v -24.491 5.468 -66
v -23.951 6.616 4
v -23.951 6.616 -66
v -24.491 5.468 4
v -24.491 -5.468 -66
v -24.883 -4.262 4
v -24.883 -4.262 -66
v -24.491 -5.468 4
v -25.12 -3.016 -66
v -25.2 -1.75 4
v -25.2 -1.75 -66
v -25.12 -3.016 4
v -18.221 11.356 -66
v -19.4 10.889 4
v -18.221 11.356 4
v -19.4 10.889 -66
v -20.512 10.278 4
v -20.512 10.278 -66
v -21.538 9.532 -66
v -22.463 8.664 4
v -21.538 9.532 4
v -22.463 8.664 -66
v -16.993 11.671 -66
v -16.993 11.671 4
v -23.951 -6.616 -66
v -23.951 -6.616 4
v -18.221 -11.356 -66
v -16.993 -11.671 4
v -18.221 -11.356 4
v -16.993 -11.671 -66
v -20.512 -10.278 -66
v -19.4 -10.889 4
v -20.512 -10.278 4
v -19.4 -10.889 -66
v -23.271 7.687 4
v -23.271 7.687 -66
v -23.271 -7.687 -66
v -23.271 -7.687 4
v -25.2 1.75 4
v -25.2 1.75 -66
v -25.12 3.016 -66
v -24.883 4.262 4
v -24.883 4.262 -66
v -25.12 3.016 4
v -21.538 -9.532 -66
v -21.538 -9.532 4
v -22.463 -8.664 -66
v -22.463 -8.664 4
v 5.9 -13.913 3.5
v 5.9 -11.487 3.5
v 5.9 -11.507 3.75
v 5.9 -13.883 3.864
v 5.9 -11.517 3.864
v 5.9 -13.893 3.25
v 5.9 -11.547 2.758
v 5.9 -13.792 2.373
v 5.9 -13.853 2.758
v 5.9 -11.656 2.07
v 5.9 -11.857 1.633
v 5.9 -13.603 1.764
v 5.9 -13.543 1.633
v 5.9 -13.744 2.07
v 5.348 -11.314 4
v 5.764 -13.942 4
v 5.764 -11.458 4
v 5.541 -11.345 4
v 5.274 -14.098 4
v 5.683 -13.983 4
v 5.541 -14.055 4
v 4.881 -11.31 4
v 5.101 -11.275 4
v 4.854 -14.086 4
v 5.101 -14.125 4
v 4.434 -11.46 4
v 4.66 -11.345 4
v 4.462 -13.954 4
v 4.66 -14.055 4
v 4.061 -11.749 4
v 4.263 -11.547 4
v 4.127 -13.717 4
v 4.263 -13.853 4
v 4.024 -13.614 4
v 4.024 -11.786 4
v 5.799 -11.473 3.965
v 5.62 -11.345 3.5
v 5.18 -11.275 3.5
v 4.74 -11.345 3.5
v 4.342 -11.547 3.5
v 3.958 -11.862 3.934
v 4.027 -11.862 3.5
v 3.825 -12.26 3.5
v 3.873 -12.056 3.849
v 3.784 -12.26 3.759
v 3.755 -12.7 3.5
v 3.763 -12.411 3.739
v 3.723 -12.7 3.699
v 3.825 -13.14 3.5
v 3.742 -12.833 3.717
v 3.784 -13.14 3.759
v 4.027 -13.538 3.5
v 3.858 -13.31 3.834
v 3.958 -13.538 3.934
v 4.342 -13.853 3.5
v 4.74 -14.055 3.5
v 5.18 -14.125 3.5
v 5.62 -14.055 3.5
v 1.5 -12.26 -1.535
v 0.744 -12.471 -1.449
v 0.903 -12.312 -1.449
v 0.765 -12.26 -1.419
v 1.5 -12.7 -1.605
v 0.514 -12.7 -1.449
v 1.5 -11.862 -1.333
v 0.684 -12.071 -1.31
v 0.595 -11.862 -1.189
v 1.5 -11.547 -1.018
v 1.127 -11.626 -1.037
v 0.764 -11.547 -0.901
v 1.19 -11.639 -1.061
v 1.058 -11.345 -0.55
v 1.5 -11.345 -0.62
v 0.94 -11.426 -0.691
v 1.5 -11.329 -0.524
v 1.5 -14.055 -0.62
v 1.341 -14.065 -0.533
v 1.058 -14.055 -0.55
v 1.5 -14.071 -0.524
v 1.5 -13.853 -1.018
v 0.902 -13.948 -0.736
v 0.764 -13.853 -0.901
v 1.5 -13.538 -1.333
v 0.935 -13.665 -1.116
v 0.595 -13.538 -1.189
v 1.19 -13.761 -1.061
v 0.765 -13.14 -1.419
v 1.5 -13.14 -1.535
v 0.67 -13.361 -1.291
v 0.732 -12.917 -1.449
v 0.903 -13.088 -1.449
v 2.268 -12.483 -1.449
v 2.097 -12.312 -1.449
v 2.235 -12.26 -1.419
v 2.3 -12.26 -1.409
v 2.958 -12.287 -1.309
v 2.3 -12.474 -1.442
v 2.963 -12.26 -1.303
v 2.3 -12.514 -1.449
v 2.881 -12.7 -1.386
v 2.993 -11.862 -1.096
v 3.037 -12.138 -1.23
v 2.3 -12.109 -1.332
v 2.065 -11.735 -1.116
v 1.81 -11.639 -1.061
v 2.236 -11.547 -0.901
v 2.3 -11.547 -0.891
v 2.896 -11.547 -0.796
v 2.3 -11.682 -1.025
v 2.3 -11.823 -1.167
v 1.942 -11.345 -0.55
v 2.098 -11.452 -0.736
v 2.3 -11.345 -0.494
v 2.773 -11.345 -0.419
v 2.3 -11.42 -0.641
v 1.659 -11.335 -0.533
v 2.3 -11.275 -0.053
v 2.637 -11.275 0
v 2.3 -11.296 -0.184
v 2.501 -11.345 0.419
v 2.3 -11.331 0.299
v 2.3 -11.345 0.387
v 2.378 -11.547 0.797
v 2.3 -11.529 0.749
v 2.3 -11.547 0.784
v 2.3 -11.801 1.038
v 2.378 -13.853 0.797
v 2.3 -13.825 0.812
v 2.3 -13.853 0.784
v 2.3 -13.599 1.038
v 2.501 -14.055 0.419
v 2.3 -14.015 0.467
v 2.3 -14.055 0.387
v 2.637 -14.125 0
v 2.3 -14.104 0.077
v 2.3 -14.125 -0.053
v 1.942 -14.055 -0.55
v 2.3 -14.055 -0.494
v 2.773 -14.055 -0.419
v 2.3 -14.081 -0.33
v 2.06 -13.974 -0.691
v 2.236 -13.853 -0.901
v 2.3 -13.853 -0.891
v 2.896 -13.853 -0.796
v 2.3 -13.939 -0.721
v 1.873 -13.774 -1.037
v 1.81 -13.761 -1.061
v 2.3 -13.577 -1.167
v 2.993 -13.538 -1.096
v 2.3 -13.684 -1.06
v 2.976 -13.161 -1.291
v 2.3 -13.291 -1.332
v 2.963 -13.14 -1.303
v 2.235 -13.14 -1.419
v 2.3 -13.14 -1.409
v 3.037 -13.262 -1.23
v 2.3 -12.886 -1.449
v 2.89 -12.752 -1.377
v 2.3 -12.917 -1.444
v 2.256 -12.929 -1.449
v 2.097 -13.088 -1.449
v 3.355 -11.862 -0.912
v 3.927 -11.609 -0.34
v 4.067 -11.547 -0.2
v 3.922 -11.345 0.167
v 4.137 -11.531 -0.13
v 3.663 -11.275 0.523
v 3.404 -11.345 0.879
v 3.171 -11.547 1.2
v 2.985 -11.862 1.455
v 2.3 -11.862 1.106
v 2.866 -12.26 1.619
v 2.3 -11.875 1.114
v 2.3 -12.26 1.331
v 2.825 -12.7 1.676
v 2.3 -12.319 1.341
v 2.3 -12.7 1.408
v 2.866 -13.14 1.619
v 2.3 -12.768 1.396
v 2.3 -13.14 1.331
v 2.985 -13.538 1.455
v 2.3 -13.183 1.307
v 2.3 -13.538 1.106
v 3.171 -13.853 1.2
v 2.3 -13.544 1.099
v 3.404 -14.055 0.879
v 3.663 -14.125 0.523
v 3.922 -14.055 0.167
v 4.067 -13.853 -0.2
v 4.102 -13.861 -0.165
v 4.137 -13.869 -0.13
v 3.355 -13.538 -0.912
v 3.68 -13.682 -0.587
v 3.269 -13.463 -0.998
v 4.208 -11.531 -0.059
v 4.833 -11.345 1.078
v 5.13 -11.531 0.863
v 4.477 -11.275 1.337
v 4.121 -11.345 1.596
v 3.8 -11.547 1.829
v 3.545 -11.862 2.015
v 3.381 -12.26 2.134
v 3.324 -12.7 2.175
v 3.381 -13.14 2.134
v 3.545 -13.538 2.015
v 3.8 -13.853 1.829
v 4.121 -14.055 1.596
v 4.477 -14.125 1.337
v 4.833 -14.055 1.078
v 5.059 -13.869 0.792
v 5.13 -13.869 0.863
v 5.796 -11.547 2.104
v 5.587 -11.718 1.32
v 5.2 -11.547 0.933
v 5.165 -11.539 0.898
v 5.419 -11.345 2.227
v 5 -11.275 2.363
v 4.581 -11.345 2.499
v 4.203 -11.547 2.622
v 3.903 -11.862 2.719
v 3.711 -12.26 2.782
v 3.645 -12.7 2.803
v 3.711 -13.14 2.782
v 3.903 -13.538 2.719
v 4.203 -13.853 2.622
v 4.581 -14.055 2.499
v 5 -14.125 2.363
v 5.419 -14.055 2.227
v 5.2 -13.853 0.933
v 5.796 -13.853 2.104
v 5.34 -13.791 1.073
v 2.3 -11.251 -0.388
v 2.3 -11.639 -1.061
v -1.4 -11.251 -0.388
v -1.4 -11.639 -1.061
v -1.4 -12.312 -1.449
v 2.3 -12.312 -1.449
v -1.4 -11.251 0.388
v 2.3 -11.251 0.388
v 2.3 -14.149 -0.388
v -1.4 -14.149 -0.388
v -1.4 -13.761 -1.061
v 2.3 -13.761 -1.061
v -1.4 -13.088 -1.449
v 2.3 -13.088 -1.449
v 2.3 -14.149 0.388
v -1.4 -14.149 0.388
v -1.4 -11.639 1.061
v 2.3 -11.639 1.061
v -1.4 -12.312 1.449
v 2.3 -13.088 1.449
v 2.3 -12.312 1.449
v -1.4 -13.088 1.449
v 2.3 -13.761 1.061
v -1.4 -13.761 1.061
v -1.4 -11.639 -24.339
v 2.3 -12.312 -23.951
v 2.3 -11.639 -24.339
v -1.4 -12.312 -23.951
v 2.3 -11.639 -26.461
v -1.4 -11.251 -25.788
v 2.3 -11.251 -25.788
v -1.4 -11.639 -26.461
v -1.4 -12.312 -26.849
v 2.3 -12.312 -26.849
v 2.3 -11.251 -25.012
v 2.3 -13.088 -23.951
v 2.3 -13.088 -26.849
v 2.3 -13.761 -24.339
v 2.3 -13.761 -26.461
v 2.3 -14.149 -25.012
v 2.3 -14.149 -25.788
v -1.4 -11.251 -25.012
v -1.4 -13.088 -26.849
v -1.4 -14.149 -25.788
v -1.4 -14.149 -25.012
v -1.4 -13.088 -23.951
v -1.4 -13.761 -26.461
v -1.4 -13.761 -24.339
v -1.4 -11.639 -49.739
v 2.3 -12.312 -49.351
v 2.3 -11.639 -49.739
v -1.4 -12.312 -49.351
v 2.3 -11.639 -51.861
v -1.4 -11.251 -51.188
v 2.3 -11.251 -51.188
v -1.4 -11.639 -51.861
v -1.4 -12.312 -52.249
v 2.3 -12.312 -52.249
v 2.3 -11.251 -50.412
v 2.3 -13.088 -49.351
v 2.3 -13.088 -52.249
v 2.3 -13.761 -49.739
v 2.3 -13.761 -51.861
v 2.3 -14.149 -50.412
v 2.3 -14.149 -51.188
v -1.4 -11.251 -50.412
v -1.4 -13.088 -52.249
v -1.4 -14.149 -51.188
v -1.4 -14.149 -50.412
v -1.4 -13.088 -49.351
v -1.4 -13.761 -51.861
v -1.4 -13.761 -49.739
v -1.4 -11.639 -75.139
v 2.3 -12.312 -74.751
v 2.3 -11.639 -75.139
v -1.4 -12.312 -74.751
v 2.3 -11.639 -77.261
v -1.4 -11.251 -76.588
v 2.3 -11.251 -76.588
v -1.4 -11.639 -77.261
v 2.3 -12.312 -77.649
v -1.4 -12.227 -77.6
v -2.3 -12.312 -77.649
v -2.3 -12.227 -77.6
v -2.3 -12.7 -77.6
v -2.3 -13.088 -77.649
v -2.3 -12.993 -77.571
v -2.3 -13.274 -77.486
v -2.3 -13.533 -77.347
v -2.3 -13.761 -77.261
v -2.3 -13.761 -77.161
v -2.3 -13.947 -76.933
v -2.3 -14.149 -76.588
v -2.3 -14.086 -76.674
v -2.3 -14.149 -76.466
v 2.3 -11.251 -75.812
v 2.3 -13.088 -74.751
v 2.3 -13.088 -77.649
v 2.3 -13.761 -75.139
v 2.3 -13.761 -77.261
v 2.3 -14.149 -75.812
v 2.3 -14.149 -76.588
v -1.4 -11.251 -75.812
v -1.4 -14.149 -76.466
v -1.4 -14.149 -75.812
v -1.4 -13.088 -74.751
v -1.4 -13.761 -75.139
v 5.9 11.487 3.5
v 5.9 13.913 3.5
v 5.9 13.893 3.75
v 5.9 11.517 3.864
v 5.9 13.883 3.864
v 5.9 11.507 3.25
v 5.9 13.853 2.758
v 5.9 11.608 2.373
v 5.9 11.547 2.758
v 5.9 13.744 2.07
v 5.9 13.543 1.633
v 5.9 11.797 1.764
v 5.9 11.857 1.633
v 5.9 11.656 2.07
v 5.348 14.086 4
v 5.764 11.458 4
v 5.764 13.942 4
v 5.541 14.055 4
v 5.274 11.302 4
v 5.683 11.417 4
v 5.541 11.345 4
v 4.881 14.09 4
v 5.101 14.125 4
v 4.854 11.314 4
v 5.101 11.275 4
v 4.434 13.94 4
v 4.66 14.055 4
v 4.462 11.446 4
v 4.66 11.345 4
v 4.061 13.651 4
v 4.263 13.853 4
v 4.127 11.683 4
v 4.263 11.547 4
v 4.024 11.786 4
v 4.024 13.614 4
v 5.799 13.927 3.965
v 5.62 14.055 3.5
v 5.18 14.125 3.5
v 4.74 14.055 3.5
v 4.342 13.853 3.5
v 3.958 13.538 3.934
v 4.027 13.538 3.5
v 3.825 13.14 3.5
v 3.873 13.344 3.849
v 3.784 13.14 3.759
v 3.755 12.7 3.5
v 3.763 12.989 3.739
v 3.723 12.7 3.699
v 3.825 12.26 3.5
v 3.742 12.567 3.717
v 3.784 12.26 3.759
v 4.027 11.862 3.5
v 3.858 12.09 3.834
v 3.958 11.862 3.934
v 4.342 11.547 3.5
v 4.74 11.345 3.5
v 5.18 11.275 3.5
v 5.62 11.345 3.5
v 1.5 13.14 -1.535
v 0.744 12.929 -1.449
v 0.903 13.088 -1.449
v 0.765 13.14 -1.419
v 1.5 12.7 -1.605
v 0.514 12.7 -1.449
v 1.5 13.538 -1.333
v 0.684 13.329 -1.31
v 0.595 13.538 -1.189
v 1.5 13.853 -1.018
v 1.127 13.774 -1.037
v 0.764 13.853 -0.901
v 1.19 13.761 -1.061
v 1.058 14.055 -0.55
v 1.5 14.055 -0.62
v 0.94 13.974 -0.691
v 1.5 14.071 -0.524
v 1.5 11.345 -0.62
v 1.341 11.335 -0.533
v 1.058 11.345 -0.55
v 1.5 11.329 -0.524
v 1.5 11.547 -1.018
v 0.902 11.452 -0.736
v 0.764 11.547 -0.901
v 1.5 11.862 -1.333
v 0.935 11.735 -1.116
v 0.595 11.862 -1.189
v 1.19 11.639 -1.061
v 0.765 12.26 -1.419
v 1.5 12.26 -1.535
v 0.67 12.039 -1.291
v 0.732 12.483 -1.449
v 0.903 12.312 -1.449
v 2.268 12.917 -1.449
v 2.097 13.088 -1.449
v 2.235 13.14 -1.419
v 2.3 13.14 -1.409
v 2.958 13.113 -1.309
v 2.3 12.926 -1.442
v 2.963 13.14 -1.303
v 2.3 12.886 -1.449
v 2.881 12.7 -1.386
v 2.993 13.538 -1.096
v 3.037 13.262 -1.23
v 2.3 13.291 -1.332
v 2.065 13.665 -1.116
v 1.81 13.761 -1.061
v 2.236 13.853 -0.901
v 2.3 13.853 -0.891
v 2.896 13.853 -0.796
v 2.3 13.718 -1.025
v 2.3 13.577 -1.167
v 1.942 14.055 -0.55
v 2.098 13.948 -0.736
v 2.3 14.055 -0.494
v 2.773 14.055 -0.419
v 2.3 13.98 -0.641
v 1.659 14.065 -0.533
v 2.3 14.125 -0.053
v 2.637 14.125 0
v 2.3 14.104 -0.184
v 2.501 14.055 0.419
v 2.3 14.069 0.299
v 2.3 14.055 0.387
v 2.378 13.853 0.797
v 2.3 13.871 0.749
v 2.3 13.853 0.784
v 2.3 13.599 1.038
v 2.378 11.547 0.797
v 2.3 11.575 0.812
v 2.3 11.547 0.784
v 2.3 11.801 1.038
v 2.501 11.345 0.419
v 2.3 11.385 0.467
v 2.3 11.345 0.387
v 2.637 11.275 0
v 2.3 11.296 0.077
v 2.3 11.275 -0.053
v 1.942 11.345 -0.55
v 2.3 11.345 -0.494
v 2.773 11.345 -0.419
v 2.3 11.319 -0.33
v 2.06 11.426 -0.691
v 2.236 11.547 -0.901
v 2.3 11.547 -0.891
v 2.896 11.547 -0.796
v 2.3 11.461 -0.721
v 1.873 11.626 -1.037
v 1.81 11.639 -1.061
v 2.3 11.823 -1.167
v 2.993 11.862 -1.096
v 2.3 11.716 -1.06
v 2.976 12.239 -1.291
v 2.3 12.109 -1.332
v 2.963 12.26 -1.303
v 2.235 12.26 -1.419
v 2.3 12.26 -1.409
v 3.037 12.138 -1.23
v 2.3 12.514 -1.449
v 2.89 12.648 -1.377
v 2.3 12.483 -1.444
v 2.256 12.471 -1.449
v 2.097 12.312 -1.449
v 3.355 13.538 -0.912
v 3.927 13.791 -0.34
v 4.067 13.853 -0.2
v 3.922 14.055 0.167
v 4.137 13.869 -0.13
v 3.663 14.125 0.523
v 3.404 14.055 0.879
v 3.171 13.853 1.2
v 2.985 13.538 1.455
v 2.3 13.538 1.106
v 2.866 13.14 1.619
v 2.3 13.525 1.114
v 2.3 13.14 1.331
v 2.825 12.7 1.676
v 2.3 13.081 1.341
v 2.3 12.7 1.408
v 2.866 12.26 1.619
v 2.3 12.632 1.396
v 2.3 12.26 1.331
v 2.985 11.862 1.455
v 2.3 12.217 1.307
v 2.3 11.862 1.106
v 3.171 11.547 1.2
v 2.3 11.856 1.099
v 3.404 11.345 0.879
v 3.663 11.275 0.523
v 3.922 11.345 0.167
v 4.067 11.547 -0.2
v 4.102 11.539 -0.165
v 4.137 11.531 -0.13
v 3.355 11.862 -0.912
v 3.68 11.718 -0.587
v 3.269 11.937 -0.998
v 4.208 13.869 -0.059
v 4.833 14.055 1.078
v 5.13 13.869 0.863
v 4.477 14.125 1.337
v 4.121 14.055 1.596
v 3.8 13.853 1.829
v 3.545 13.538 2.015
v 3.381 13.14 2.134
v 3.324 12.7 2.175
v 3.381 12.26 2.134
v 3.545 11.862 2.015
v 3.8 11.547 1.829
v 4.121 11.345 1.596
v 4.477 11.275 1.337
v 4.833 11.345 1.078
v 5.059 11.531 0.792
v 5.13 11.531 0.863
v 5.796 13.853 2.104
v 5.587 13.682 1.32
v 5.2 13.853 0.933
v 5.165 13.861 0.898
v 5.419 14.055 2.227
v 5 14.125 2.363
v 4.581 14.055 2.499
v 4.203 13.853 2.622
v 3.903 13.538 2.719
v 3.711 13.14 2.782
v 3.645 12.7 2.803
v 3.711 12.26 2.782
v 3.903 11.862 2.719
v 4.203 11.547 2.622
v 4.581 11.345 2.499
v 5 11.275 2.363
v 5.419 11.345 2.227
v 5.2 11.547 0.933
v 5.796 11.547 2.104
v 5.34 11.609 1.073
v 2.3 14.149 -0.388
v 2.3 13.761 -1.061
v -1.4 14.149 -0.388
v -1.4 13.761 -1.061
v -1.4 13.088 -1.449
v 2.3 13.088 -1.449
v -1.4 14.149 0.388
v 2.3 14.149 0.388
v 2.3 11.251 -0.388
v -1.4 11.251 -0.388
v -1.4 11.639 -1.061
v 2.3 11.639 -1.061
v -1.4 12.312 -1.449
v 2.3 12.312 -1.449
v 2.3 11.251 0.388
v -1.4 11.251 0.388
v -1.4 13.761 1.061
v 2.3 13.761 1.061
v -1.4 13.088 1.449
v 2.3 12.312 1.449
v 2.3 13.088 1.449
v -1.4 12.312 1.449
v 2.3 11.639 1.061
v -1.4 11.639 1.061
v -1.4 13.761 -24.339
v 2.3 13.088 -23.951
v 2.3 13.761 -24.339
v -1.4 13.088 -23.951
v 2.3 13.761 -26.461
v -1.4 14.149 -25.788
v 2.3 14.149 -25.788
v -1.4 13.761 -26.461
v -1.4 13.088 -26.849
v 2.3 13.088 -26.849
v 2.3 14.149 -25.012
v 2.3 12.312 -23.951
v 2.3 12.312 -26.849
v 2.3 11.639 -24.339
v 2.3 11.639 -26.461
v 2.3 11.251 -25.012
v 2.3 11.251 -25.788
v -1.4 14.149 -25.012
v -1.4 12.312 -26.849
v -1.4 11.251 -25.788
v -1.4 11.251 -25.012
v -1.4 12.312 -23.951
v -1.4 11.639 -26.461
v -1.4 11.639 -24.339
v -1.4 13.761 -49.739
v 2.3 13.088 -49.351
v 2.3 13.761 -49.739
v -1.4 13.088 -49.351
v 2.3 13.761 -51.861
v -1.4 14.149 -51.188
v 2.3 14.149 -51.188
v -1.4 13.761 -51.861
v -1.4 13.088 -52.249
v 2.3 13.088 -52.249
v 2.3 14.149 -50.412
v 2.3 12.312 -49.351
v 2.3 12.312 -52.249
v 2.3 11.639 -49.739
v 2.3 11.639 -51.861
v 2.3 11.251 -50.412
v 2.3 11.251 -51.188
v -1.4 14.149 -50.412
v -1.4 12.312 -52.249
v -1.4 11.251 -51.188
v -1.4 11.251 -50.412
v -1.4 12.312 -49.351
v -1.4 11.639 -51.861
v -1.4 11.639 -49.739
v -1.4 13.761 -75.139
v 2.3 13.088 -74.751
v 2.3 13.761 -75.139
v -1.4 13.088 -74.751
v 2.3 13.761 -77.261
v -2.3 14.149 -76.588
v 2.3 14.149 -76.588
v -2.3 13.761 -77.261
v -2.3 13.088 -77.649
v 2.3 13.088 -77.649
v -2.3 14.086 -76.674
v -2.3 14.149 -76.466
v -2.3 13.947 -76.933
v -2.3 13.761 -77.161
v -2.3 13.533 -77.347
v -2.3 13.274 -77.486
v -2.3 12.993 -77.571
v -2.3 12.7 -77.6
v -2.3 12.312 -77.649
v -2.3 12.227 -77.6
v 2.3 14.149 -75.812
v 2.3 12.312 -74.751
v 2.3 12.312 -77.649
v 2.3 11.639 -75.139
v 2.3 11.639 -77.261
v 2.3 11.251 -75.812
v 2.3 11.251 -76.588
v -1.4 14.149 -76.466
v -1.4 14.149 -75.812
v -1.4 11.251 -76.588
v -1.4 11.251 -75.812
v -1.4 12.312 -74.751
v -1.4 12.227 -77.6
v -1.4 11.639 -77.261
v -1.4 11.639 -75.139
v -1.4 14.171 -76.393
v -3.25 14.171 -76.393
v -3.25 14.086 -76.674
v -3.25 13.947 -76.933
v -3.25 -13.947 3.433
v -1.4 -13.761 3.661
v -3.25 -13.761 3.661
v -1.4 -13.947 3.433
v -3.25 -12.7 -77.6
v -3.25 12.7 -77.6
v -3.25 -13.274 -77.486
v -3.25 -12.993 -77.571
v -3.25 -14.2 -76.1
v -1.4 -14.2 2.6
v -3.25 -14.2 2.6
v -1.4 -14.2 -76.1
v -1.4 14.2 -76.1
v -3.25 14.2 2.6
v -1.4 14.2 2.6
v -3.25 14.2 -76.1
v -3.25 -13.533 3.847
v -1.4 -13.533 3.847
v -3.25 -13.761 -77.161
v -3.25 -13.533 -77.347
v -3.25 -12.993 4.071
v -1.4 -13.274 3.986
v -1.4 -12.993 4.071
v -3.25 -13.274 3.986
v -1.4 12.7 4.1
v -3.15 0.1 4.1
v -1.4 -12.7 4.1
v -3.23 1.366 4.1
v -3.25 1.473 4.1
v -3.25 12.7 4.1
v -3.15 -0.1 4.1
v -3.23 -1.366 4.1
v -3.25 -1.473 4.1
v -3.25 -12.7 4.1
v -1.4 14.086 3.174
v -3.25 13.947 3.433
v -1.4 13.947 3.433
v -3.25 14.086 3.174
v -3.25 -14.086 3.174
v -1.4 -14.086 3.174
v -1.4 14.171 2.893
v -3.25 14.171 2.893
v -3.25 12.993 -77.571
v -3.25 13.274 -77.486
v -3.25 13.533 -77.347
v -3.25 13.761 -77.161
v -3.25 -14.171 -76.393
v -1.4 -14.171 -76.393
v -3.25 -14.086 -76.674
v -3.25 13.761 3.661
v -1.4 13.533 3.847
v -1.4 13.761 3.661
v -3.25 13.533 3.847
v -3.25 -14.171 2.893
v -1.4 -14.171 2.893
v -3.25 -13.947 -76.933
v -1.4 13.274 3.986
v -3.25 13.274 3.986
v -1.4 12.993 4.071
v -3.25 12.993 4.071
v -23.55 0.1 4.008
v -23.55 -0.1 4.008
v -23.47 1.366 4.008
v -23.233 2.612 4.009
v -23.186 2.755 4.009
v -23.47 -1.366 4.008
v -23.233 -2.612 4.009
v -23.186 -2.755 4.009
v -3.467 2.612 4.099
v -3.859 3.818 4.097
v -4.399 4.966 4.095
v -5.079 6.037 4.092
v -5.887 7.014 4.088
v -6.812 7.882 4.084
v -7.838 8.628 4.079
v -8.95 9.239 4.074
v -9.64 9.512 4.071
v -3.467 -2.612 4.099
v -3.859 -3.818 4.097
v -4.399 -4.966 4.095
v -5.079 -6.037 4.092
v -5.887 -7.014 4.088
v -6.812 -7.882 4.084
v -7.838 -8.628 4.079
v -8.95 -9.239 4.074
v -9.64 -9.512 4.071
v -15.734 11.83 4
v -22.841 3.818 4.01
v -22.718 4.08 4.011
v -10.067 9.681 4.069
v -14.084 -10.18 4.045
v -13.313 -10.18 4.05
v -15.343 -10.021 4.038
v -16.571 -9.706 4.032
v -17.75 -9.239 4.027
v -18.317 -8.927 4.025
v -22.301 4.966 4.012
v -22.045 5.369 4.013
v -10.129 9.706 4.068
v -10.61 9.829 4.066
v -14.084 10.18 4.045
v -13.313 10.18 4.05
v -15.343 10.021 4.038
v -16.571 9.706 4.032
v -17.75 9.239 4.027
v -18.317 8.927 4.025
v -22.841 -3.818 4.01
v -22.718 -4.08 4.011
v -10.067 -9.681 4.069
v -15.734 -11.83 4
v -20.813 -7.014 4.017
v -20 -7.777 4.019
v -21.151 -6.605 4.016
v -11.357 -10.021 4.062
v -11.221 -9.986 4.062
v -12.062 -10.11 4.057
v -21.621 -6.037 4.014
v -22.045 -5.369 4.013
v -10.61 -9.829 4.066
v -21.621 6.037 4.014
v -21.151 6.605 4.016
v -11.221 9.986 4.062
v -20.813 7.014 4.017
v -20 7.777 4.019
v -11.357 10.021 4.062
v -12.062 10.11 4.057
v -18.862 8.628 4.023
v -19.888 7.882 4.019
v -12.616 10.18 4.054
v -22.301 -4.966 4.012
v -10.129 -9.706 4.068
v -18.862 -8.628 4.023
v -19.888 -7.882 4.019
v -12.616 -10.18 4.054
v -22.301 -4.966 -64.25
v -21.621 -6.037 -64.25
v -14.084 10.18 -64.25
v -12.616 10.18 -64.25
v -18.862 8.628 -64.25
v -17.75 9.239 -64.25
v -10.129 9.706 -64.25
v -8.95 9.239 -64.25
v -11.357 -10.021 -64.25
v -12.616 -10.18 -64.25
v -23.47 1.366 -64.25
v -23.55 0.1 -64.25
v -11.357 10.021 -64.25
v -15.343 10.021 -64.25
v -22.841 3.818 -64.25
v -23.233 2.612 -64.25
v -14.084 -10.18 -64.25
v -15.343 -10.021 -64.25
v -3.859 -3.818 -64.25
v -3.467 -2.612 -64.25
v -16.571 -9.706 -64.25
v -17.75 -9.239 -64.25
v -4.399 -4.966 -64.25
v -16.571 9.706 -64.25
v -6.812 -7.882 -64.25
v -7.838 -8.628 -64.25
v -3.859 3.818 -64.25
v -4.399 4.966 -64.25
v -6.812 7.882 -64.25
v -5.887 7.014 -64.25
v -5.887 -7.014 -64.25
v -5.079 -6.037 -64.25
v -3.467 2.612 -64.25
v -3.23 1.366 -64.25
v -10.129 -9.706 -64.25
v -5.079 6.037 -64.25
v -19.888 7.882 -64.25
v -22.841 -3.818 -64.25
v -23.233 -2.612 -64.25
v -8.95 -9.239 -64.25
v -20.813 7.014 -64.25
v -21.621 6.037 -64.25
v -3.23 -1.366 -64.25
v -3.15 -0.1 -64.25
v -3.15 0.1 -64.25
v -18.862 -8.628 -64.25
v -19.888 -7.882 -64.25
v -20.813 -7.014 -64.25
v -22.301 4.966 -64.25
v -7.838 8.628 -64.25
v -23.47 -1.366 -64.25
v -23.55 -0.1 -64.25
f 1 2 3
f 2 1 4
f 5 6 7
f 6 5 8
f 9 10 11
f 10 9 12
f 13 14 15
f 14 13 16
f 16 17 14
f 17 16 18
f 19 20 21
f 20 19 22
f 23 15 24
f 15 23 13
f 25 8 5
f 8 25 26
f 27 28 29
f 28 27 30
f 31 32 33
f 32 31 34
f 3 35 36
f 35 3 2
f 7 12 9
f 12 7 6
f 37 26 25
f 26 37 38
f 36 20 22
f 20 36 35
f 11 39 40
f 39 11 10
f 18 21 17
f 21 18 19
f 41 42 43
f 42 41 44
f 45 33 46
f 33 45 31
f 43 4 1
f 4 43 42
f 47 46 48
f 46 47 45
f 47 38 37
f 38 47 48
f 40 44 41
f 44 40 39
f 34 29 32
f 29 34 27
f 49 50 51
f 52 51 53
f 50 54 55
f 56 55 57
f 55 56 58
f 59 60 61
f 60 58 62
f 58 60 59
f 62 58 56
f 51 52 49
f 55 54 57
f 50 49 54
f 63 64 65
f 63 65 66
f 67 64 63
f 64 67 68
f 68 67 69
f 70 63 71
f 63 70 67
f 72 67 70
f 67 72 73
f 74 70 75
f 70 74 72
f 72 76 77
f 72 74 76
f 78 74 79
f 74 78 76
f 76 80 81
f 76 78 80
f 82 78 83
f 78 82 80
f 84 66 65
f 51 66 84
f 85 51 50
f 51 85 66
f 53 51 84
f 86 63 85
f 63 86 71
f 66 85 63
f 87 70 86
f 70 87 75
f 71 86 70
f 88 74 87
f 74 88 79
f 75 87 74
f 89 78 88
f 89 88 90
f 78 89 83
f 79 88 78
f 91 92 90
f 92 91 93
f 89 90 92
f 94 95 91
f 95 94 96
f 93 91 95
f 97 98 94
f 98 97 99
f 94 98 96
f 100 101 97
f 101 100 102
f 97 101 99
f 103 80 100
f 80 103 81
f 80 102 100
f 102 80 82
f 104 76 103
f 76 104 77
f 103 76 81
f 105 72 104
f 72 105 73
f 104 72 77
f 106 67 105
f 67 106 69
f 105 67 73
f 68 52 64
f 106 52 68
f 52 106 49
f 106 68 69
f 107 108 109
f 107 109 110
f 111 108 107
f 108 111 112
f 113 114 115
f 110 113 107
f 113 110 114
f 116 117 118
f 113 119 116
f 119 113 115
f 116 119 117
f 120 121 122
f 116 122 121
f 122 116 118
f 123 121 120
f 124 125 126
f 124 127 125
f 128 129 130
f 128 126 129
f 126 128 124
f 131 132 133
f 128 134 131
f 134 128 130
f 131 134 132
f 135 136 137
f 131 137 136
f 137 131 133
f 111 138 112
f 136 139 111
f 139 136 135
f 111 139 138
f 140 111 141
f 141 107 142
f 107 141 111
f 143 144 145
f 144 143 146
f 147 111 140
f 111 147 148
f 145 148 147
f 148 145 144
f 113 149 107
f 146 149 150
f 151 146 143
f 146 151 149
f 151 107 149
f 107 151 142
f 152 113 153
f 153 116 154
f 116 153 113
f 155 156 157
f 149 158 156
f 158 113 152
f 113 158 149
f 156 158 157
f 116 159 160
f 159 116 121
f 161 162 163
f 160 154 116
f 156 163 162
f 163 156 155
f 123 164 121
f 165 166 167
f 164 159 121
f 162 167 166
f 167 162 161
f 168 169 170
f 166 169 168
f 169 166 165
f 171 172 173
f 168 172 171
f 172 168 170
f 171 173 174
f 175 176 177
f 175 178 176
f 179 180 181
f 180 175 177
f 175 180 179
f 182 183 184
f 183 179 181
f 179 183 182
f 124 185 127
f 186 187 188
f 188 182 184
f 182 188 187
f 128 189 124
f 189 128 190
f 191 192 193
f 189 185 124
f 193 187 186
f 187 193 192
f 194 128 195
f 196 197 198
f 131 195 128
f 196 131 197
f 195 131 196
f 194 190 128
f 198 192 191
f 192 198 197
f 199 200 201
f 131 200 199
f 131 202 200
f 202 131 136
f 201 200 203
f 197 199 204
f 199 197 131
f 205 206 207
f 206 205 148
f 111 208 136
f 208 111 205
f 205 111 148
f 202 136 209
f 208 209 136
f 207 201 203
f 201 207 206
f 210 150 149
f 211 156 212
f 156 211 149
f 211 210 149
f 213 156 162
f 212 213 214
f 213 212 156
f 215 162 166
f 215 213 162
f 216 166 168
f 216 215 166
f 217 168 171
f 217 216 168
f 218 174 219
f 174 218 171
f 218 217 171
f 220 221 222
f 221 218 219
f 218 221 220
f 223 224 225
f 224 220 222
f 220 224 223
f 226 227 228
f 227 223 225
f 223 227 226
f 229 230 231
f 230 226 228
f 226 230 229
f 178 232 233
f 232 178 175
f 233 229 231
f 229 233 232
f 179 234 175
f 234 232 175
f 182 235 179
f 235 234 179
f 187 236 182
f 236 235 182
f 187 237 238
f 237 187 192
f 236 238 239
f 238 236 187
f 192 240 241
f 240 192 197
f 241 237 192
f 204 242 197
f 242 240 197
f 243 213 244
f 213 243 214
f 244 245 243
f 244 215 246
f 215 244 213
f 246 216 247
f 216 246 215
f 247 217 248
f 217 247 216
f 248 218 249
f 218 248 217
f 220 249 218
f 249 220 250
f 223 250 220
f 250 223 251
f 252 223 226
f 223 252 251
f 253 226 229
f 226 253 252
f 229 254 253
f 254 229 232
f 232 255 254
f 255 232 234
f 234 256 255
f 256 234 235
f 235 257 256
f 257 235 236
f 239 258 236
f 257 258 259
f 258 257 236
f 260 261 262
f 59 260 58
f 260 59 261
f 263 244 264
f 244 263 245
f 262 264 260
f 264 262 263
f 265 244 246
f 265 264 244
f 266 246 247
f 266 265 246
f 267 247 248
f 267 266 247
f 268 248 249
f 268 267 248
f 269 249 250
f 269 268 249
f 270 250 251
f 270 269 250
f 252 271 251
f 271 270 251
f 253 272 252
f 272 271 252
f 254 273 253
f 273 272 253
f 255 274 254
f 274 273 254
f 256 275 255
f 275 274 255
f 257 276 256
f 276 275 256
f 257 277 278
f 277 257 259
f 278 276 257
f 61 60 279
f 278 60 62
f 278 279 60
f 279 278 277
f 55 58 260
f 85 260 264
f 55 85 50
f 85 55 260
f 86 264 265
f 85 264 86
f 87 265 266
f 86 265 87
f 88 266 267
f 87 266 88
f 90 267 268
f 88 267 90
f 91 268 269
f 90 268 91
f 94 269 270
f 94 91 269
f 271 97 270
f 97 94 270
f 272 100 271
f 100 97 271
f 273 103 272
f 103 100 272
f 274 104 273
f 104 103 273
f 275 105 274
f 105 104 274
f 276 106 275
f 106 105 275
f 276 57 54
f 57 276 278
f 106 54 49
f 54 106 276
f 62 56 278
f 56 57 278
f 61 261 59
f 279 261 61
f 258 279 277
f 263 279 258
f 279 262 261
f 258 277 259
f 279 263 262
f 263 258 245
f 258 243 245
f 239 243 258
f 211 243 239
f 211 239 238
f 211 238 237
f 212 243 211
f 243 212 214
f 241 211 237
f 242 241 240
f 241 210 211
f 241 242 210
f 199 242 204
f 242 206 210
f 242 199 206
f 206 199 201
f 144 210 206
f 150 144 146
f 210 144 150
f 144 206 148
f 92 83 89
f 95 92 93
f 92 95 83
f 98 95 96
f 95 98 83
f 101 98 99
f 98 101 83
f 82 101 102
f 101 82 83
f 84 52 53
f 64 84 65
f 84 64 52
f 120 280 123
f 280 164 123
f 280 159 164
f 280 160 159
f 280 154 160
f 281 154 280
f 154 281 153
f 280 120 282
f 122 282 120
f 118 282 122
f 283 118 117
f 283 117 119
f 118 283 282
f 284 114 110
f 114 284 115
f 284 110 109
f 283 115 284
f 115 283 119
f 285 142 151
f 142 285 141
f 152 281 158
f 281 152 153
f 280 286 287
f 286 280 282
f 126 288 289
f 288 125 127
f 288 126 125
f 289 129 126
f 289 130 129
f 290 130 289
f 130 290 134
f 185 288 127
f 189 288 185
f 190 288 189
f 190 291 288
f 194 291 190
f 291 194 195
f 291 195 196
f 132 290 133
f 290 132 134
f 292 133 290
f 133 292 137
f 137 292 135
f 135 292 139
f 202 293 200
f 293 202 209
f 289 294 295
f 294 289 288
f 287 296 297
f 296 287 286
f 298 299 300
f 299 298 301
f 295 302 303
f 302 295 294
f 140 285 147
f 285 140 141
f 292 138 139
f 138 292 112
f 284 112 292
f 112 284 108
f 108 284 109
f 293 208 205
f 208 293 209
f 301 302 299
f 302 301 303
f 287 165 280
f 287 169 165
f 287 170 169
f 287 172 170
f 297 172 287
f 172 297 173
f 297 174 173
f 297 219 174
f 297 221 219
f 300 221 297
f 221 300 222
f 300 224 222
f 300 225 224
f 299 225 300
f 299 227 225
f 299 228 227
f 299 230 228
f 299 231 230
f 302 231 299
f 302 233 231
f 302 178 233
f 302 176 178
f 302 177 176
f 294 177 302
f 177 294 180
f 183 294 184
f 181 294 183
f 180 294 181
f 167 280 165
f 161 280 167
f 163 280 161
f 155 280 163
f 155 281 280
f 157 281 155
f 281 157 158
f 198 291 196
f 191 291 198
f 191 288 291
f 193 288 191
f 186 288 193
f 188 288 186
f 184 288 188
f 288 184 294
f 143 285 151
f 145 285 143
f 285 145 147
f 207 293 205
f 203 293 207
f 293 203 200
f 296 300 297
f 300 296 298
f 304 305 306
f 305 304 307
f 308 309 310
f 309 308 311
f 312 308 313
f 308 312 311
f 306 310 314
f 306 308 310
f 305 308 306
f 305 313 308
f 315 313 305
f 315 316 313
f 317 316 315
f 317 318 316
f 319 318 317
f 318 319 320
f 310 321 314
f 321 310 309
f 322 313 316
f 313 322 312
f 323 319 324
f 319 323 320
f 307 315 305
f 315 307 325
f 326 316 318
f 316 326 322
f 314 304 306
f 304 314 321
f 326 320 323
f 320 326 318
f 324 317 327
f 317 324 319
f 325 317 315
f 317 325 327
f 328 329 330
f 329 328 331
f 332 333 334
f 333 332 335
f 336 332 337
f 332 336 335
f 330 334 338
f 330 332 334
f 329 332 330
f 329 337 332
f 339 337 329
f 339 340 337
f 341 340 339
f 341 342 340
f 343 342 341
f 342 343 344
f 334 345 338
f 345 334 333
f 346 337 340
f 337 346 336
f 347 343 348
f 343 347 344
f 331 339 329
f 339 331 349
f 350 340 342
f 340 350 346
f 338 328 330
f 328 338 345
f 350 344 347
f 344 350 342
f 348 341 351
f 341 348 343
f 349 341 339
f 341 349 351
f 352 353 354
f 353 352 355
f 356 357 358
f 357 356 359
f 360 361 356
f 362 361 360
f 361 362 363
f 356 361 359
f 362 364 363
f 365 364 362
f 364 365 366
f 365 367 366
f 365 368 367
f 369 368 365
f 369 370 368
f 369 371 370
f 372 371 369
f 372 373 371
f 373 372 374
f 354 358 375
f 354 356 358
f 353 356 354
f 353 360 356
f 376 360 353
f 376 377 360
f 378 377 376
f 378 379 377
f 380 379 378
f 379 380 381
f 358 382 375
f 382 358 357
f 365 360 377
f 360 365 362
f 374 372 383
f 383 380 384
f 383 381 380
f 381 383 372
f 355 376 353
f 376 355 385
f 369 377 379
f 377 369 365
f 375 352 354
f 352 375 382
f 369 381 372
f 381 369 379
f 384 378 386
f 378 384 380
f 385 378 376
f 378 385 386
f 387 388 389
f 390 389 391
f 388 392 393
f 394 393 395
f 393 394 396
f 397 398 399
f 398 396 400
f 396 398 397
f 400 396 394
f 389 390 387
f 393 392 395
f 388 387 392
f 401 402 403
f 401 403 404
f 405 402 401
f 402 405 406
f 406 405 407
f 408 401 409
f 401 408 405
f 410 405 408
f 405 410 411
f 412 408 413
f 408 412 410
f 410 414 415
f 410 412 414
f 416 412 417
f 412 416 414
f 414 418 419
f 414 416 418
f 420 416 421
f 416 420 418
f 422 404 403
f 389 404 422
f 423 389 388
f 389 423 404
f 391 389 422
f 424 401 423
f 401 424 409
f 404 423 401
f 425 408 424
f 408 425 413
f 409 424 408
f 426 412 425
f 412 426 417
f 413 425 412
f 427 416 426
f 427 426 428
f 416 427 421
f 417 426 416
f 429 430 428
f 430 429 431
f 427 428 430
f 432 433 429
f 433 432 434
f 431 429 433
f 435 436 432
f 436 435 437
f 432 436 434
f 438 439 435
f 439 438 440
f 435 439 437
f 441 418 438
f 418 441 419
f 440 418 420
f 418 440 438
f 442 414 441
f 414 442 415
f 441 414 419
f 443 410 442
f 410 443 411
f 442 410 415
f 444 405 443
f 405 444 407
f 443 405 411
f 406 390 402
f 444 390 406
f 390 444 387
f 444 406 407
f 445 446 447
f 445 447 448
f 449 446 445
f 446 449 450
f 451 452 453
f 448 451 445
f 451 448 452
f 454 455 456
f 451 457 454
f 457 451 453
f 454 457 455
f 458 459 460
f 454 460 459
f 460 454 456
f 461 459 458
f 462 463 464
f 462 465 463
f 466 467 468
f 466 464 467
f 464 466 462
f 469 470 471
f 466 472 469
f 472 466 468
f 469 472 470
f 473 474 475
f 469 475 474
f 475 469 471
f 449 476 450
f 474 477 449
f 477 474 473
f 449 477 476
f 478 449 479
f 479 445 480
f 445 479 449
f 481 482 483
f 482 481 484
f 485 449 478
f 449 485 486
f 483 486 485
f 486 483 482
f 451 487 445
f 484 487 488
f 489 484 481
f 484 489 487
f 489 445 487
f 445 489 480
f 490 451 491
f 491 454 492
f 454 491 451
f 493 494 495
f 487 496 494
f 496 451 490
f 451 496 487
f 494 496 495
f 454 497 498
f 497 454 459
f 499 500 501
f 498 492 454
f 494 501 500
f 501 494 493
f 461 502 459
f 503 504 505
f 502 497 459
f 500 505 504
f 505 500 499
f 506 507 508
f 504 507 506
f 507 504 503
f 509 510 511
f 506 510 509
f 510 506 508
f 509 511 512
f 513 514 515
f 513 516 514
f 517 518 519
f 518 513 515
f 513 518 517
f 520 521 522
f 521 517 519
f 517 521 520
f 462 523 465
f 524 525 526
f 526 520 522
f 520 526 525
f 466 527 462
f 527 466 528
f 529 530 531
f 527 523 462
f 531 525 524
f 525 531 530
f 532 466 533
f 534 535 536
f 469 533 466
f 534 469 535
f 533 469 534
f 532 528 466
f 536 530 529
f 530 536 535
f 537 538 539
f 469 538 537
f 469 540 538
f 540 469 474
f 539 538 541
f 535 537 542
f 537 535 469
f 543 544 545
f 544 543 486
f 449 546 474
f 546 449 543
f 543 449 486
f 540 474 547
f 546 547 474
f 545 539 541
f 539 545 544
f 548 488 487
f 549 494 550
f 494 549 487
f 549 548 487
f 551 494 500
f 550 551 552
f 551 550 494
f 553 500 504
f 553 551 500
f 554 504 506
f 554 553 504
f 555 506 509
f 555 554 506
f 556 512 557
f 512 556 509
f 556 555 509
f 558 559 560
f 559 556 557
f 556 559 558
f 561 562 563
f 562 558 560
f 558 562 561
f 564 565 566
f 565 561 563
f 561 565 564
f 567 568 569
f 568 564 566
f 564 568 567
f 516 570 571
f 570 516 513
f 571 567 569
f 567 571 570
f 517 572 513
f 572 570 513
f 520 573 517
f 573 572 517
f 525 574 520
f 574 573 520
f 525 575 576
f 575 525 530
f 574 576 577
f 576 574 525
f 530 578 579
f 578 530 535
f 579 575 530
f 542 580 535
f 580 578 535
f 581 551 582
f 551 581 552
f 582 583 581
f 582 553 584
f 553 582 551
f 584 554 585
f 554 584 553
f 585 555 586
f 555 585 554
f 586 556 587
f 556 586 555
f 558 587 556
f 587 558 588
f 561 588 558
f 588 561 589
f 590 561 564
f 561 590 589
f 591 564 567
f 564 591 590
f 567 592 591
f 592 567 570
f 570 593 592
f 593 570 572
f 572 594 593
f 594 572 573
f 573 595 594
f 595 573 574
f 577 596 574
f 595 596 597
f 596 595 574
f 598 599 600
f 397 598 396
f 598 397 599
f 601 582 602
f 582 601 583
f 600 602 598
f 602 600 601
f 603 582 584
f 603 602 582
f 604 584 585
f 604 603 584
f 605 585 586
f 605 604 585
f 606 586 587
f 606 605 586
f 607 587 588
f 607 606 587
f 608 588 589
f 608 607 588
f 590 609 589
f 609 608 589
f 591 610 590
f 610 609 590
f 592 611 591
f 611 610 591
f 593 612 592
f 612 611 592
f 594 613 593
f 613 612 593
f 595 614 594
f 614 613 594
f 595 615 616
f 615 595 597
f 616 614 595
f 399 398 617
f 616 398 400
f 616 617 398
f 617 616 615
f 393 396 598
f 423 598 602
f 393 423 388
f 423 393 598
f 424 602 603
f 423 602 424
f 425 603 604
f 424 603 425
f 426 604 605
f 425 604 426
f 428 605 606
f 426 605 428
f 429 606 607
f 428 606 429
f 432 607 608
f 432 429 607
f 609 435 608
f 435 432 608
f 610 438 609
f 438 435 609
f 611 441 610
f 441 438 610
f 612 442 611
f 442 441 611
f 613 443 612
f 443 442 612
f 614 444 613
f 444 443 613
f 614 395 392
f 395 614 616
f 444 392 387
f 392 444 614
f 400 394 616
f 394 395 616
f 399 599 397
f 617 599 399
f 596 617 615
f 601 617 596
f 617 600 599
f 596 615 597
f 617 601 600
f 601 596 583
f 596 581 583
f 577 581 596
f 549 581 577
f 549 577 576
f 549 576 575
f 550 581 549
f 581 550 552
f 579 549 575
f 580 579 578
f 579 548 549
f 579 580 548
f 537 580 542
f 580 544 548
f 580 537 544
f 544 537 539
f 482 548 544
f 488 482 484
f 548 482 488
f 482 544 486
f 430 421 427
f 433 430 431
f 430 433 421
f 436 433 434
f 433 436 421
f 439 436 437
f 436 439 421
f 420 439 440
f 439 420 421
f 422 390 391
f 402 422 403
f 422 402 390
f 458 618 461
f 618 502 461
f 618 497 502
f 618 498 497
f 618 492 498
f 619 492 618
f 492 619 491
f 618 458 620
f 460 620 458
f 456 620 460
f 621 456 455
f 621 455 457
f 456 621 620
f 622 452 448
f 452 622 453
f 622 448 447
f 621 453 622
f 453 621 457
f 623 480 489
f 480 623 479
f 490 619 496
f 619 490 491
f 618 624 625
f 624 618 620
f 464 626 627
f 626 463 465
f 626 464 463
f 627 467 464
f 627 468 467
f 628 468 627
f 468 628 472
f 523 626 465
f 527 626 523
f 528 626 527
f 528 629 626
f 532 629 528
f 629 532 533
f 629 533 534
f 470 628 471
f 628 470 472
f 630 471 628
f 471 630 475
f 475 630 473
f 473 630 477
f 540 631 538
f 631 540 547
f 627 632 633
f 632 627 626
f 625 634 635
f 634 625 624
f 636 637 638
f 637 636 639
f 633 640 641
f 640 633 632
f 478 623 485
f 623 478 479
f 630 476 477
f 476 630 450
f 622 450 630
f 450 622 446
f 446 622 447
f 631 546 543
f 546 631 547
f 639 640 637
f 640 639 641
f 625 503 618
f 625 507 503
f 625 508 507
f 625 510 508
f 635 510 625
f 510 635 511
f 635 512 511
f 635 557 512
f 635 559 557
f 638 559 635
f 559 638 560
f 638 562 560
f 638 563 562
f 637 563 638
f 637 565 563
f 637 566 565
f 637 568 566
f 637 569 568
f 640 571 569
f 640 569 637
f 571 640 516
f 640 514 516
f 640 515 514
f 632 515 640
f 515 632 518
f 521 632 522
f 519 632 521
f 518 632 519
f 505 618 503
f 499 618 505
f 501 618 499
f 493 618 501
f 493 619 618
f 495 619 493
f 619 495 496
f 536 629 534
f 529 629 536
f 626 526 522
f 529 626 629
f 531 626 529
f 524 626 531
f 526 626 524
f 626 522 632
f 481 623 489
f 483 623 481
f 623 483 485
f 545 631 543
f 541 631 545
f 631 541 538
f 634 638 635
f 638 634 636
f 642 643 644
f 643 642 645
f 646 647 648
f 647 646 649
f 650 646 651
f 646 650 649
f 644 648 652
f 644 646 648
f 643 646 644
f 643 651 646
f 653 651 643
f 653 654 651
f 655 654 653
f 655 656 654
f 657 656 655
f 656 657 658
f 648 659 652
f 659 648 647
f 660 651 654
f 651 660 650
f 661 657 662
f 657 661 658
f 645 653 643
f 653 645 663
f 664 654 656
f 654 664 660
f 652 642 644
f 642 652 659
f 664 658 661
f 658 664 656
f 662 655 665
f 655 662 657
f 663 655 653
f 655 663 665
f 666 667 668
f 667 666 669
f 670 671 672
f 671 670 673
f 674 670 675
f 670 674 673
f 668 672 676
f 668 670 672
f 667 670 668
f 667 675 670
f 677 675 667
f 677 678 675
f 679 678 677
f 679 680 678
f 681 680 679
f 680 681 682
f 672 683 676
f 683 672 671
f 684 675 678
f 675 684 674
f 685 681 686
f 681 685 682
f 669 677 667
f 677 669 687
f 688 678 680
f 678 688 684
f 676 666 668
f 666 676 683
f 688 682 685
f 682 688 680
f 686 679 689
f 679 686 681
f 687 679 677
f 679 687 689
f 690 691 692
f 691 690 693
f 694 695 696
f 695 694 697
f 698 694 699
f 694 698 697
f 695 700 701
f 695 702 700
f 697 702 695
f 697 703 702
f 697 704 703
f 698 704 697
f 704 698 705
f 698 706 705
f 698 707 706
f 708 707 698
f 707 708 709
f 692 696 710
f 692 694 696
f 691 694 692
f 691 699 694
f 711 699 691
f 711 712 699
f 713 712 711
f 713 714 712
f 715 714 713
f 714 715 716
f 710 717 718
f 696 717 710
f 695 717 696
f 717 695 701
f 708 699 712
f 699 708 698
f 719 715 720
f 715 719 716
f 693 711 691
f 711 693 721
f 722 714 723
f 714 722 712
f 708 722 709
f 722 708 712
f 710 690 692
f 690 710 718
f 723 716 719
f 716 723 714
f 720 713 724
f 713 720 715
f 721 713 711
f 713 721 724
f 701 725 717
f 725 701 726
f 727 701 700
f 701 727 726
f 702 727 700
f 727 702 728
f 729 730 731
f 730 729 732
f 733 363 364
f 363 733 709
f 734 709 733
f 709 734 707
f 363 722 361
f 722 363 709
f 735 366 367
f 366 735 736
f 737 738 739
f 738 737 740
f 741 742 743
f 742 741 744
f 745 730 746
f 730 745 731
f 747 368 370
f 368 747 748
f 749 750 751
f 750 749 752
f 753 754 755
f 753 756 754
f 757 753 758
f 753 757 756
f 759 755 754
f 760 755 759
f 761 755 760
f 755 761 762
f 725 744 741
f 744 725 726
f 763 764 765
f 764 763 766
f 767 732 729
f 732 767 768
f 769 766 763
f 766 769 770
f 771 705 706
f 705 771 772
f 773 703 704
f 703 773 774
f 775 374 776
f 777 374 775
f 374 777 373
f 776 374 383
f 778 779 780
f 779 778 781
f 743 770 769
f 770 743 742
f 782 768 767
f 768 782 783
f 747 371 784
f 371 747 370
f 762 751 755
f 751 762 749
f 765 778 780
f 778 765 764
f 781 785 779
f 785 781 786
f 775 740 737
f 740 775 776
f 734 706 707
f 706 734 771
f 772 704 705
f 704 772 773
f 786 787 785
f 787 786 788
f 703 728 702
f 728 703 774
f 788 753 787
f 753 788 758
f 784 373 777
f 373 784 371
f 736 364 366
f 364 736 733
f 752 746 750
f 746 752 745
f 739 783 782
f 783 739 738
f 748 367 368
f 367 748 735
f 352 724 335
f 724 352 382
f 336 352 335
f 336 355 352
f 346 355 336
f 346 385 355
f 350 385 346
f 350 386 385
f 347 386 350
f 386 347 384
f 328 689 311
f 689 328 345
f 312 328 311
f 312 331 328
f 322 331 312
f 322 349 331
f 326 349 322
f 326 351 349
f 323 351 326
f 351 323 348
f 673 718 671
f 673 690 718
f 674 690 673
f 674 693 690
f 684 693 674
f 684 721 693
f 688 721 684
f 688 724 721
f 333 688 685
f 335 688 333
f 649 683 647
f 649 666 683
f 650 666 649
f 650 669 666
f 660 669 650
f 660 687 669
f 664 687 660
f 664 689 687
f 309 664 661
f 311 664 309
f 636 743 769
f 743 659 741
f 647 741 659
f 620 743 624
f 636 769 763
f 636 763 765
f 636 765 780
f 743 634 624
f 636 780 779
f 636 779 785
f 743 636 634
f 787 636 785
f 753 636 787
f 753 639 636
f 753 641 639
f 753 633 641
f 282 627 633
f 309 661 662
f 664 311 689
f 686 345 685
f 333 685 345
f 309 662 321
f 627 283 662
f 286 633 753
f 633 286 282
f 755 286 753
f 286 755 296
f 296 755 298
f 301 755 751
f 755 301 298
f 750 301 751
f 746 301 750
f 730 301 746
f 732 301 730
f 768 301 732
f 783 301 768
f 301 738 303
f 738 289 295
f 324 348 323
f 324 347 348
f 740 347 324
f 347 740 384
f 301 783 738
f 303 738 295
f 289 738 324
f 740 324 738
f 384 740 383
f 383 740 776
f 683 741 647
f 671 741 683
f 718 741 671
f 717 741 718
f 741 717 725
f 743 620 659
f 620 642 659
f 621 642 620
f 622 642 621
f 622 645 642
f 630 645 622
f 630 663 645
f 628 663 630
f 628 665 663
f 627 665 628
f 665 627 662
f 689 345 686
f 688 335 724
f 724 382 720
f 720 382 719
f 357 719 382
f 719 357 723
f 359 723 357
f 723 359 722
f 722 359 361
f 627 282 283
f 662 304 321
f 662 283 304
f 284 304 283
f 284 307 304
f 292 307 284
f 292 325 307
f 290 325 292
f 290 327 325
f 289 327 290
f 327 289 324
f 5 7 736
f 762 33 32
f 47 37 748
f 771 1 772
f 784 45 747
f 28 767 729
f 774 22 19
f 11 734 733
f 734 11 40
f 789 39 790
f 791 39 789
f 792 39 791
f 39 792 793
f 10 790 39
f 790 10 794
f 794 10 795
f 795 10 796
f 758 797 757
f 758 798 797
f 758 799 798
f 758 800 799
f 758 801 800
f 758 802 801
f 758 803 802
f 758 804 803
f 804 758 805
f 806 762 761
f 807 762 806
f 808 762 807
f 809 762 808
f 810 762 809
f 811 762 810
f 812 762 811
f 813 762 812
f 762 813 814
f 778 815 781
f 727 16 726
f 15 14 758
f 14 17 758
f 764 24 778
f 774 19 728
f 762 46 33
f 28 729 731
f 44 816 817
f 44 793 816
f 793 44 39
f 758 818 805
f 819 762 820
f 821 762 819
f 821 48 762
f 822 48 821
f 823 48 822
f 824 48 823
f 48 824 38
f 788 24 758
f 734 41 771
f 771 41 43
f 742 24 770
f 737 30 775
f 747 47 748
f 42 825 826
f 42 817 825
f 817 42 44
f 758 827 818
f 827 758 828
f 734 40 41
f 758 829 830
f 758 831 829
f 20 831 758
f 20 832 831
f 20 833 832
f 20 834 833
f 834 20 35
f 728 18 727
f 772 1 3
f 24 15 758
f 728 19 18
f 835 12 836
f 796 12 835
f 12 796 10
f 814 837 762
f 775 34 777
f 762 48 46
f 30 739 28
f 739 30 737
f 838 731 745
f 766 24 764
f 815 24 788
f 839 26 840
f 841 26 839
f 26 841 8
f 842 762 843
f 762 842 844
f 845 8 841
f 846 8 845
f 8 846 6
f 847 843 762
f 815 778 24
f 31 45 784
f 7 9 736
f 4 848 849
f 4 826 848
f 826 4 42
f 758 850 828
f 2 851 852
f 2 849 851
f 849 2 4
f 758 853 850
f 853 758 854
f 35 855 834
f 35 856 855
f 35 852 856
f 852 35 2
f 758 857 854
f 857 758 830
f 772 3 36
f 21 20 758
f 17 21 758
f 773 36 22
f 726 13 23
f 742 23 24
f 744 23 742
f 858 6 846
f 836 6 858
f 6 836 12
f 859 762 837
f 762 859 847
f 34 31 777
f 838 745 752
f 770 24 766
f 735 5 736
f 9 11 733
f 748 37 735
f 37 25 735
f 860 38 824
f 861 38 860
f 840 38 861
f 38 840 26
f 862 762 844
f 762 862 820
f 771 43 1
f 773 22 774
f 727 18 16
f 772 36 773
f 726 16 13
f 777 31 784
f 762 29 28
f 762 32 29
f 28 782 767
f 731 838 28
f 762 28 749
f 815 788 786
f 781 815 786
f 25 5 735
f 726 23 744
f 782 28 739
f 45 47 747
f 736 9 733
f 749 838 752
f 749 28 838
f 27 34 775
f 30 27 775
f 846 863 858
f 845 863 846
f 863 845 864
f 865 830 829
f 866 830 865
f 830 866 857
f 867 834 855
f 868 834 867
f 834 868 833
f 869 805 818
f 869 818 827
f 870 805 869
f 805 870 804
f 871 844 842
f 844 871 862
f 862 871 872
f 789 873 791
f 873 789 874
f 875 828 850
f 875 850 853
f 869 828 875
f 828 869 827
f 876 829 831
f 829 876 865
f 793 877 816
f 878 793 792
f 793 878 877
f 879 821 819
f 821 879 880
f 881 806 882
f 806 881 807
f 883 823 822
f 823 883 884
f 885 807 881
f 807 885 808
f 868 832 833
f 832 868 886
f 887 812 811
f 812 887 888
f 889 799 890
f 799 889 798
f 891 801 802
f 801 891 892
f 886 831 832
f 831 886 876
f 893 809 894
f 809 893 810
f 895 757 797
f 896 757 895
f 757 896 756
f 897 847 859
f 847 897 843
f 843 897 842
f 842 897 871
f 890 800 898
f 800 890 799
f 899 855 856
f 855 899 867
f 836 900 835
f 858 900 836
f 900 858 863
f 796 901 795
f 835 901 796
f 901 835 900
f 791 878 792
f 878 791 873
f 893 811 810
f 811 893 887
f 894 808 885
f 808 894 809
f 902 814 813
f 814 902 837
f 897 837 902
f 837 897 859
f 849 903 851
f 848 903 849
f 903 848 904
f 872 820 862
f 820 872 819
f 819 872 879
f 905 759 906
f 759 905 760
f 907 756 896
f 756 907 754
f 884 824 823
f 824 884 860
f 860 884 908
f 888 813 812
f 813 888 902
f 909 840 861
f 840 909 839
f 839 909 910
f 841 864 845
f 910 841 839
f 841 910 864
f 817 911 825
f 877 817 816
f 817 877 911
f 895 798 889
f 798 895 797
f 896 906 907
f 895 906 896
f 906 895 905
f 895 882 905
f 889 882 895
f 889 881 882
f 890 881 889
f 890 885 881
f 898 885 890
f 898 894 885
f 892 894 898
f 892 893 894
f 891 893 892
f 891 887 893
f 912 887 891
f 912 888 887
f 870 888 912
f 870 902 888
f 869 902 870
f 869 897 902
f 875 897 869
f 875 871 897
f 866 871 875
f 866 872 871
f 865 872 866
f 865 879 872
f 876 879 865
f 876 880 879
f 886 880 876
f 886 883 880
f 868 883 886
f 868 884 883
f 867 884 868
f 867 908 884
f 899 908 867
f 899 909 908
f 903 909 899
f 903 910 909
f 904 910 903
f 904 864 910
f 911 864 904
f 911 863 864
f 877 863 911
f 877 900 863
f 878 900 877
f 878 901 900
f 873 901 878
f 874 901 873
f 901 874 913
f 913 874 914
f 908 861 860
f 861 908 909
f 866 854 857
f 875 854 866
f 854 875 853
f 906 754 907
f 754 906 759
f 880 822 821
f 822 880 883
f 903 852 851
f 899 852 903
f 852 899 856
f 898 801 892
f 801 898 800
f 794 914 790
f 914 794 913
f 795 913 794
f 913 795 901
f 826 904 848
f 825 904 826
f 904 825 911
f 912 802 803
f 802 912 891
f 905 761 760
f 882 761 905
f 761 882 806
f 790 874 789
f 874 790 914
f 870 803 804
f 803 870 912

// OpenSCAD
// PEGSTR - Pegboard Wizard
// Design by Marius Gheorghescu, November 2014
// Update log:
// November 9th 2014
//		- first coomplete version. Angled holders are often odd/incorrect.
// November 15th 2014
//		- minor tweaks to increase rendering speed. added logo. 
// November 28th 2014
//		- bug fixes
// June 14th 2016
//		- added holder_x_size_space and  holder_y_size_space
//		- handling different hole_size

// preview[view:north, tilt:bottom diagonal]

// width of the orifice
holder_x_size = 20;

// x space between orifice
holder_x_size_space = 2;

// depth of the orifice
holder_y_size = 20;

// y space between orifice
holder_y_size_space = 2;

// hight of the holder
holder_height = 70;

// how thick are the walls. Hint: 6*extrusion width produces the best results.
wall_thickness = 1.85;

// how many times to repeat the holder on X axis
holder_x_count = 1;

// how many times to repeat the holder on Y axis
holder_y_count = 1;

// orifice corner radius (roundness). Needs to be less than min(x,y)/2.
corner_radius = 10;

// Use values less than 1.0 to make the bottom of the holder narrow
taper_ratio = 1.0;


/* [Advanced] */

// offset from the peg board, typically 0 unless you have an object that needs clearance
holder_offset = 0;

// what ratio of the holders bottom is reinforced to the plate [0.0-1.0]
strength_factor = 1.0;

// for bins: what ratio of wall thickness to use for closing the bottom
closed_bottom = 1;

// what percentage cu cut in the front (example to slip in a cable or make the tool snap from the side)
holder_cutout_side = 0.0;

// set an angle for the holder to prevent object from sliding or to view it better from the top
holder_angle = 0;

// hole spacing
hole_spacing = 25.4;
// hole size
hole_size = 3;
// board thickness
board_thickness = 3;


/* [Hidden] */

// what is the $fn parameter
holder_sides = max(50, min(20, holder_x_size*2));




holder_total_x = wall_thickness + holder_x_count*(wall_thickness+holder_x_size)+(holder_x_count-1)*holder_x_size_space;
holder_total_y = wall_thickness + holder_y_count*(wall_thickness+holder_y_size)+(holder_y_count-1)*holder_y_size_space;
holder_total_z = round(holder_height/hole_spacing)*hole_spacing;
holder_roundness = min(corner_radius, holder_x_size/2, holder_y_size/2); 


// what is the $fn parameter for holders
fn = 32;

epsilon = 0.1;

clip_height = 2*hole_size + 2;
$fn = fn;

module round_rect_ex(x1, y1, x2, y2, z, r1, r2)
{
	$fn=holder_sides;
	brim = z/10;

	//rotate([0,0,(holder_sides==6)?30:((holder_sides==4)?45:0)])
	hull() {
        translate([-x1/2 + r1, y1/2 - r1, z/2-brim/2])
            cylinder(r=r1, h=brim,center=true);
        translate([x1/2 - r1, y1/2 - r1, z/2-brim/2])
            cylinder(r=r1, h=brim,center=true);
        translate([-x1/2 + r1, -y1/2 + r1, z/2-brim/2])
            cylinder(r=r1, h=brim,center=true);
        translate([x1/2 - r1, -y1/2 + r1, z/2-brim/2])
            cylinder(r=r1, h=brim,center=true);

        translate([-x2/2 + r2, y2/2 - r2, -z/2+brim/2])
            cylinder(r=r2, h=brim,center=true);
        translate([x2/2 - r2, y2/2 - r2, -z/2+brim/2])
            cylinder(r=r2, h=brim,center=true);
        translate([-x2/2 + r2, -y2/2 + r2, -z/2+brim/2])
            cylinder(r=r2, h=brim,center=true);
        translate([x2/2 - r2, -y2/2 + r2, -z/2+brim/2])
            cylinder(r=r2, h=brim,center=true);

    }
}

module pin(clip)
{
	rotate([0,0,15])
	cylinder(r=hole_size/2, h=board_thickness*1.5+epsilon, center=true, $fn=12);

	if (clip) {
		//
		rotate([0,0,90])
		intersection() {
			translate([0, 0, hole_size-epsilon])
				cube([hole_size+2*epsilon, clip_height, 2*hole_size], center=true);

			// [-hole_size/2 - 1.95,0, board_thickness/2]
			translate([0, hole_size/2 + 2, board_thickness/2]) 
				rotate([0, 90, 0])
				rotate_extrude(convexity = 5, $fn=20)
				translate([0.44*hole_size+2.36, 0, 0])
				 circle(r = (hole_size*0.95)/2); 
			
			translate([0, hole_size/2 + 2 - 1.6, board_thickness/2]) 
				rotate([45,0,0])
				translate([0, -0, hole_size*0.6])
					cube([hole_size+2*epsilon, 3*hole_size, hole_size], center=true);
		}
	}
}

module pinboard_clips() 
{
	rotate([0,90,0])
	for(i=[0:round(holder_total_x/hole_spacing)]) {
		for(j=[0:max(strength_factor, round(holder_height/hole_spacing))]) {

			translate([
				j*hole_spacing, 
				-hole_spacing*(round(holder_total_x/hole_spacing)/2) + i*hole_spacing, 
				0])
					pin(j==0);
		}
	}
}

module pinboard(clips)
{
	rotate([0,90,0])
	translate([-epsilon, 0, -wall_thickness - board_thickness/2 + epsilon])
	hull() {
		translate([-clip_height/2 + hole_size/2, 
			-hole_spacing*(round(holder_total_x/hole_spacing)/2),0])
			cylinder(r=hole_size/2, h=wall_thickness);

		translate([-clip_height/2 + hole_size/2, 
			hole_spacing*(round(holder_total_x/hole_spacing)/2),0])
			cylinder(r=hole_size/2,  h=wall_thickness);

		translate([max(strength_factor, round(holder_height/hole_spacing))*hole_spacing,
			-hole_spacing*(round(holder_total_x/hole_spacing)/2),0])
			cylinder(r=hole_size/2, h=wall_thickness);

		translate([max(strength_factor, round(holder_height/hole_spacing))*hole_spacing,
			hole_spacing*(round(holder_total_x/hole_spacing)/2),0])
			cylinder(r=hole_size/2,  h=wall_thickness);

	}
}

module holder(negative)
{
	for(x=[1:holder_x_count]){
		for(y=[1:holder_y_count]) 
/*		render(convexity=2)*/ {
			translate([
				-holder_total_y /*- (holder_y_size+wall_thickness)/2*/ + y*(holder_y_size+wall_thickness+holder_y_size_space) + wall_thickness,

				-holder_total_x/2 + (holder_x_size+wall_thickness)/2 + (x-1)*(holder_x_size+wall_thickness+holder_x_size_space) + wall_thickness/2,
				 0])			
	{
		rotate([0, holder_angle, 0])
		translate([
			-wall_thickness*abs(sin(holder_angle))-0*abs((holder_y_size/2)*sin(holder_angle))-holder_offset-holder_y_size_space-(holder_y_size + 2*wall_thickness)/2 - board_thickness/2,
			0,
			-(holder_height/2)*sin(holder_angle) - holder_height/2 + clip_height/2
		])
		difference() {
			if (!negative)
                // external piece
				round_rect_ex(
					(holder_y_size + 2*wall_thickness), 
					holder_x_size + 2*wall_thickness, 
					(holder_y_size + 2*wall_thickness)*taper_ratio, 
					(holder_x_size + 2*wall_thickness)*taper_ratio, 
					holder_height, 
					holder_roundness + epsilon, 
					holder_roundness*taper_ratio + epsilon);

				translate([0,0,closed_bottom*wall_thickness])

				if (negative>1) {
					round_rect_ex(
						holder_y_size*taper_ratio, 
						holder_x_size*taper_ratio, 
						holder_y_size*taper_ratio, 
						holder_x_size*taper_ratio, 
						3*max(holder_height, hole_spacing),
						holder_roundness*taper_ratio + epsilon, 
						holder_roundness*taper_ratio + epsilon);
				} else {
                    //internal holes
					round_rect_ex( 
						holder_y_size, 
						holder_x_size, 
						holder_y_size*taper_ratio, 
						holder_x_size*taper_ratio, 
						holder_height+2*epsilon,
						holder_roundness + epsilon, 
						holder_roundness*taper_ratio + epsilon);
				}

			if (!negative)
				if (holder_cutout_side > 0) {

				if (negative>1) {
					hull() {
						scale([1.0, holder_cutout_side, 1.0])
		 					round_rect_ex(
							holder_y_size*taper_ratio, 
							holder_x_size*taper_ratio, 
							holder_y_size*taper_ratio, 
							holder_x_size*taper_ratio, 
							3*max(holder_height, hole_spacing),
							holder_roundness*taper_ratio + epsilon, 
							holder_roundness*taper_ratio + epsilon);
		
						translate([0-(holder_y_size + 2*wall_thickness), 0,0])
						scale([1.0, holder_cutout_side, 1.0])
		 					round_rect_ex(
							holder_y_size*taper_ratio, 
							holder_x_size*taper_ratio, 
							holder_y_size*taper_ratio, 
							holder_x_size*taper_ratio, 
							3*max(holder_height, hole_spacing),
							holder_roundness*taper_ratio + epsilon, 
							holder_roundness*taper_ratio + epsilon);
					}
				} else {
					hull() {
						scale([1.0, holder_cutout_side, 1.0])
		 					round_rect_ex(
							holder_y_size, 
							holder_x_size, 
							holder_y_size*taper_ratio, 
							holder_x_size*taper_ratio, 
							holder_height+2*epsilon,
							holder_roundness + epsilon, 
							holder_roundness*taper_ratio + epsilon);
		
						translate([0-(holder_y_size + 2*wall_thickness), 0,0])
						scale([1.0, holder_cutout_side, 1.0])
		 					round_rect_ex(
							holder_y_size, 
							holder_x_size, 
							holder_y_size*taper_ratio, 
							holder_x_size*taper_ratio, 
							holder_height+2*epsilon,
							holder_roundness + epsilon, 
							holder_roundness*taper_ratio + epsilon);
						}
					}

				}
			}
		} // positioning
	} // for y
	} // for X
}


module pegstr() 
{
	difference() {
		union() {

			pinboard();


			difference() {
				hull() {
					pinboard();
	
					intersection() {
						translate([-holder_offset - (strength_factor-0.5)*holder_total_y - wall_thickness/4,0,0])
						cube([
							holder_total_y + 2*wall_thickness, 
							holder_total_x + wall_thickness, 
							2*holder_height
						], center=true);
	
						holder(0);
	
					}	
				}

				if (closed_bottom*wall_thickness < epsilon) {
						holder(2);
				}

			}

			color([0.7,0,0])
			difference() {
				holder(0);
				holder(2);
			}

			color([1,0,0])
				pinboard_clips();
		}
	
		holder(1);
	}
}


pegstr()
pinboard();
pinboard_clips();
